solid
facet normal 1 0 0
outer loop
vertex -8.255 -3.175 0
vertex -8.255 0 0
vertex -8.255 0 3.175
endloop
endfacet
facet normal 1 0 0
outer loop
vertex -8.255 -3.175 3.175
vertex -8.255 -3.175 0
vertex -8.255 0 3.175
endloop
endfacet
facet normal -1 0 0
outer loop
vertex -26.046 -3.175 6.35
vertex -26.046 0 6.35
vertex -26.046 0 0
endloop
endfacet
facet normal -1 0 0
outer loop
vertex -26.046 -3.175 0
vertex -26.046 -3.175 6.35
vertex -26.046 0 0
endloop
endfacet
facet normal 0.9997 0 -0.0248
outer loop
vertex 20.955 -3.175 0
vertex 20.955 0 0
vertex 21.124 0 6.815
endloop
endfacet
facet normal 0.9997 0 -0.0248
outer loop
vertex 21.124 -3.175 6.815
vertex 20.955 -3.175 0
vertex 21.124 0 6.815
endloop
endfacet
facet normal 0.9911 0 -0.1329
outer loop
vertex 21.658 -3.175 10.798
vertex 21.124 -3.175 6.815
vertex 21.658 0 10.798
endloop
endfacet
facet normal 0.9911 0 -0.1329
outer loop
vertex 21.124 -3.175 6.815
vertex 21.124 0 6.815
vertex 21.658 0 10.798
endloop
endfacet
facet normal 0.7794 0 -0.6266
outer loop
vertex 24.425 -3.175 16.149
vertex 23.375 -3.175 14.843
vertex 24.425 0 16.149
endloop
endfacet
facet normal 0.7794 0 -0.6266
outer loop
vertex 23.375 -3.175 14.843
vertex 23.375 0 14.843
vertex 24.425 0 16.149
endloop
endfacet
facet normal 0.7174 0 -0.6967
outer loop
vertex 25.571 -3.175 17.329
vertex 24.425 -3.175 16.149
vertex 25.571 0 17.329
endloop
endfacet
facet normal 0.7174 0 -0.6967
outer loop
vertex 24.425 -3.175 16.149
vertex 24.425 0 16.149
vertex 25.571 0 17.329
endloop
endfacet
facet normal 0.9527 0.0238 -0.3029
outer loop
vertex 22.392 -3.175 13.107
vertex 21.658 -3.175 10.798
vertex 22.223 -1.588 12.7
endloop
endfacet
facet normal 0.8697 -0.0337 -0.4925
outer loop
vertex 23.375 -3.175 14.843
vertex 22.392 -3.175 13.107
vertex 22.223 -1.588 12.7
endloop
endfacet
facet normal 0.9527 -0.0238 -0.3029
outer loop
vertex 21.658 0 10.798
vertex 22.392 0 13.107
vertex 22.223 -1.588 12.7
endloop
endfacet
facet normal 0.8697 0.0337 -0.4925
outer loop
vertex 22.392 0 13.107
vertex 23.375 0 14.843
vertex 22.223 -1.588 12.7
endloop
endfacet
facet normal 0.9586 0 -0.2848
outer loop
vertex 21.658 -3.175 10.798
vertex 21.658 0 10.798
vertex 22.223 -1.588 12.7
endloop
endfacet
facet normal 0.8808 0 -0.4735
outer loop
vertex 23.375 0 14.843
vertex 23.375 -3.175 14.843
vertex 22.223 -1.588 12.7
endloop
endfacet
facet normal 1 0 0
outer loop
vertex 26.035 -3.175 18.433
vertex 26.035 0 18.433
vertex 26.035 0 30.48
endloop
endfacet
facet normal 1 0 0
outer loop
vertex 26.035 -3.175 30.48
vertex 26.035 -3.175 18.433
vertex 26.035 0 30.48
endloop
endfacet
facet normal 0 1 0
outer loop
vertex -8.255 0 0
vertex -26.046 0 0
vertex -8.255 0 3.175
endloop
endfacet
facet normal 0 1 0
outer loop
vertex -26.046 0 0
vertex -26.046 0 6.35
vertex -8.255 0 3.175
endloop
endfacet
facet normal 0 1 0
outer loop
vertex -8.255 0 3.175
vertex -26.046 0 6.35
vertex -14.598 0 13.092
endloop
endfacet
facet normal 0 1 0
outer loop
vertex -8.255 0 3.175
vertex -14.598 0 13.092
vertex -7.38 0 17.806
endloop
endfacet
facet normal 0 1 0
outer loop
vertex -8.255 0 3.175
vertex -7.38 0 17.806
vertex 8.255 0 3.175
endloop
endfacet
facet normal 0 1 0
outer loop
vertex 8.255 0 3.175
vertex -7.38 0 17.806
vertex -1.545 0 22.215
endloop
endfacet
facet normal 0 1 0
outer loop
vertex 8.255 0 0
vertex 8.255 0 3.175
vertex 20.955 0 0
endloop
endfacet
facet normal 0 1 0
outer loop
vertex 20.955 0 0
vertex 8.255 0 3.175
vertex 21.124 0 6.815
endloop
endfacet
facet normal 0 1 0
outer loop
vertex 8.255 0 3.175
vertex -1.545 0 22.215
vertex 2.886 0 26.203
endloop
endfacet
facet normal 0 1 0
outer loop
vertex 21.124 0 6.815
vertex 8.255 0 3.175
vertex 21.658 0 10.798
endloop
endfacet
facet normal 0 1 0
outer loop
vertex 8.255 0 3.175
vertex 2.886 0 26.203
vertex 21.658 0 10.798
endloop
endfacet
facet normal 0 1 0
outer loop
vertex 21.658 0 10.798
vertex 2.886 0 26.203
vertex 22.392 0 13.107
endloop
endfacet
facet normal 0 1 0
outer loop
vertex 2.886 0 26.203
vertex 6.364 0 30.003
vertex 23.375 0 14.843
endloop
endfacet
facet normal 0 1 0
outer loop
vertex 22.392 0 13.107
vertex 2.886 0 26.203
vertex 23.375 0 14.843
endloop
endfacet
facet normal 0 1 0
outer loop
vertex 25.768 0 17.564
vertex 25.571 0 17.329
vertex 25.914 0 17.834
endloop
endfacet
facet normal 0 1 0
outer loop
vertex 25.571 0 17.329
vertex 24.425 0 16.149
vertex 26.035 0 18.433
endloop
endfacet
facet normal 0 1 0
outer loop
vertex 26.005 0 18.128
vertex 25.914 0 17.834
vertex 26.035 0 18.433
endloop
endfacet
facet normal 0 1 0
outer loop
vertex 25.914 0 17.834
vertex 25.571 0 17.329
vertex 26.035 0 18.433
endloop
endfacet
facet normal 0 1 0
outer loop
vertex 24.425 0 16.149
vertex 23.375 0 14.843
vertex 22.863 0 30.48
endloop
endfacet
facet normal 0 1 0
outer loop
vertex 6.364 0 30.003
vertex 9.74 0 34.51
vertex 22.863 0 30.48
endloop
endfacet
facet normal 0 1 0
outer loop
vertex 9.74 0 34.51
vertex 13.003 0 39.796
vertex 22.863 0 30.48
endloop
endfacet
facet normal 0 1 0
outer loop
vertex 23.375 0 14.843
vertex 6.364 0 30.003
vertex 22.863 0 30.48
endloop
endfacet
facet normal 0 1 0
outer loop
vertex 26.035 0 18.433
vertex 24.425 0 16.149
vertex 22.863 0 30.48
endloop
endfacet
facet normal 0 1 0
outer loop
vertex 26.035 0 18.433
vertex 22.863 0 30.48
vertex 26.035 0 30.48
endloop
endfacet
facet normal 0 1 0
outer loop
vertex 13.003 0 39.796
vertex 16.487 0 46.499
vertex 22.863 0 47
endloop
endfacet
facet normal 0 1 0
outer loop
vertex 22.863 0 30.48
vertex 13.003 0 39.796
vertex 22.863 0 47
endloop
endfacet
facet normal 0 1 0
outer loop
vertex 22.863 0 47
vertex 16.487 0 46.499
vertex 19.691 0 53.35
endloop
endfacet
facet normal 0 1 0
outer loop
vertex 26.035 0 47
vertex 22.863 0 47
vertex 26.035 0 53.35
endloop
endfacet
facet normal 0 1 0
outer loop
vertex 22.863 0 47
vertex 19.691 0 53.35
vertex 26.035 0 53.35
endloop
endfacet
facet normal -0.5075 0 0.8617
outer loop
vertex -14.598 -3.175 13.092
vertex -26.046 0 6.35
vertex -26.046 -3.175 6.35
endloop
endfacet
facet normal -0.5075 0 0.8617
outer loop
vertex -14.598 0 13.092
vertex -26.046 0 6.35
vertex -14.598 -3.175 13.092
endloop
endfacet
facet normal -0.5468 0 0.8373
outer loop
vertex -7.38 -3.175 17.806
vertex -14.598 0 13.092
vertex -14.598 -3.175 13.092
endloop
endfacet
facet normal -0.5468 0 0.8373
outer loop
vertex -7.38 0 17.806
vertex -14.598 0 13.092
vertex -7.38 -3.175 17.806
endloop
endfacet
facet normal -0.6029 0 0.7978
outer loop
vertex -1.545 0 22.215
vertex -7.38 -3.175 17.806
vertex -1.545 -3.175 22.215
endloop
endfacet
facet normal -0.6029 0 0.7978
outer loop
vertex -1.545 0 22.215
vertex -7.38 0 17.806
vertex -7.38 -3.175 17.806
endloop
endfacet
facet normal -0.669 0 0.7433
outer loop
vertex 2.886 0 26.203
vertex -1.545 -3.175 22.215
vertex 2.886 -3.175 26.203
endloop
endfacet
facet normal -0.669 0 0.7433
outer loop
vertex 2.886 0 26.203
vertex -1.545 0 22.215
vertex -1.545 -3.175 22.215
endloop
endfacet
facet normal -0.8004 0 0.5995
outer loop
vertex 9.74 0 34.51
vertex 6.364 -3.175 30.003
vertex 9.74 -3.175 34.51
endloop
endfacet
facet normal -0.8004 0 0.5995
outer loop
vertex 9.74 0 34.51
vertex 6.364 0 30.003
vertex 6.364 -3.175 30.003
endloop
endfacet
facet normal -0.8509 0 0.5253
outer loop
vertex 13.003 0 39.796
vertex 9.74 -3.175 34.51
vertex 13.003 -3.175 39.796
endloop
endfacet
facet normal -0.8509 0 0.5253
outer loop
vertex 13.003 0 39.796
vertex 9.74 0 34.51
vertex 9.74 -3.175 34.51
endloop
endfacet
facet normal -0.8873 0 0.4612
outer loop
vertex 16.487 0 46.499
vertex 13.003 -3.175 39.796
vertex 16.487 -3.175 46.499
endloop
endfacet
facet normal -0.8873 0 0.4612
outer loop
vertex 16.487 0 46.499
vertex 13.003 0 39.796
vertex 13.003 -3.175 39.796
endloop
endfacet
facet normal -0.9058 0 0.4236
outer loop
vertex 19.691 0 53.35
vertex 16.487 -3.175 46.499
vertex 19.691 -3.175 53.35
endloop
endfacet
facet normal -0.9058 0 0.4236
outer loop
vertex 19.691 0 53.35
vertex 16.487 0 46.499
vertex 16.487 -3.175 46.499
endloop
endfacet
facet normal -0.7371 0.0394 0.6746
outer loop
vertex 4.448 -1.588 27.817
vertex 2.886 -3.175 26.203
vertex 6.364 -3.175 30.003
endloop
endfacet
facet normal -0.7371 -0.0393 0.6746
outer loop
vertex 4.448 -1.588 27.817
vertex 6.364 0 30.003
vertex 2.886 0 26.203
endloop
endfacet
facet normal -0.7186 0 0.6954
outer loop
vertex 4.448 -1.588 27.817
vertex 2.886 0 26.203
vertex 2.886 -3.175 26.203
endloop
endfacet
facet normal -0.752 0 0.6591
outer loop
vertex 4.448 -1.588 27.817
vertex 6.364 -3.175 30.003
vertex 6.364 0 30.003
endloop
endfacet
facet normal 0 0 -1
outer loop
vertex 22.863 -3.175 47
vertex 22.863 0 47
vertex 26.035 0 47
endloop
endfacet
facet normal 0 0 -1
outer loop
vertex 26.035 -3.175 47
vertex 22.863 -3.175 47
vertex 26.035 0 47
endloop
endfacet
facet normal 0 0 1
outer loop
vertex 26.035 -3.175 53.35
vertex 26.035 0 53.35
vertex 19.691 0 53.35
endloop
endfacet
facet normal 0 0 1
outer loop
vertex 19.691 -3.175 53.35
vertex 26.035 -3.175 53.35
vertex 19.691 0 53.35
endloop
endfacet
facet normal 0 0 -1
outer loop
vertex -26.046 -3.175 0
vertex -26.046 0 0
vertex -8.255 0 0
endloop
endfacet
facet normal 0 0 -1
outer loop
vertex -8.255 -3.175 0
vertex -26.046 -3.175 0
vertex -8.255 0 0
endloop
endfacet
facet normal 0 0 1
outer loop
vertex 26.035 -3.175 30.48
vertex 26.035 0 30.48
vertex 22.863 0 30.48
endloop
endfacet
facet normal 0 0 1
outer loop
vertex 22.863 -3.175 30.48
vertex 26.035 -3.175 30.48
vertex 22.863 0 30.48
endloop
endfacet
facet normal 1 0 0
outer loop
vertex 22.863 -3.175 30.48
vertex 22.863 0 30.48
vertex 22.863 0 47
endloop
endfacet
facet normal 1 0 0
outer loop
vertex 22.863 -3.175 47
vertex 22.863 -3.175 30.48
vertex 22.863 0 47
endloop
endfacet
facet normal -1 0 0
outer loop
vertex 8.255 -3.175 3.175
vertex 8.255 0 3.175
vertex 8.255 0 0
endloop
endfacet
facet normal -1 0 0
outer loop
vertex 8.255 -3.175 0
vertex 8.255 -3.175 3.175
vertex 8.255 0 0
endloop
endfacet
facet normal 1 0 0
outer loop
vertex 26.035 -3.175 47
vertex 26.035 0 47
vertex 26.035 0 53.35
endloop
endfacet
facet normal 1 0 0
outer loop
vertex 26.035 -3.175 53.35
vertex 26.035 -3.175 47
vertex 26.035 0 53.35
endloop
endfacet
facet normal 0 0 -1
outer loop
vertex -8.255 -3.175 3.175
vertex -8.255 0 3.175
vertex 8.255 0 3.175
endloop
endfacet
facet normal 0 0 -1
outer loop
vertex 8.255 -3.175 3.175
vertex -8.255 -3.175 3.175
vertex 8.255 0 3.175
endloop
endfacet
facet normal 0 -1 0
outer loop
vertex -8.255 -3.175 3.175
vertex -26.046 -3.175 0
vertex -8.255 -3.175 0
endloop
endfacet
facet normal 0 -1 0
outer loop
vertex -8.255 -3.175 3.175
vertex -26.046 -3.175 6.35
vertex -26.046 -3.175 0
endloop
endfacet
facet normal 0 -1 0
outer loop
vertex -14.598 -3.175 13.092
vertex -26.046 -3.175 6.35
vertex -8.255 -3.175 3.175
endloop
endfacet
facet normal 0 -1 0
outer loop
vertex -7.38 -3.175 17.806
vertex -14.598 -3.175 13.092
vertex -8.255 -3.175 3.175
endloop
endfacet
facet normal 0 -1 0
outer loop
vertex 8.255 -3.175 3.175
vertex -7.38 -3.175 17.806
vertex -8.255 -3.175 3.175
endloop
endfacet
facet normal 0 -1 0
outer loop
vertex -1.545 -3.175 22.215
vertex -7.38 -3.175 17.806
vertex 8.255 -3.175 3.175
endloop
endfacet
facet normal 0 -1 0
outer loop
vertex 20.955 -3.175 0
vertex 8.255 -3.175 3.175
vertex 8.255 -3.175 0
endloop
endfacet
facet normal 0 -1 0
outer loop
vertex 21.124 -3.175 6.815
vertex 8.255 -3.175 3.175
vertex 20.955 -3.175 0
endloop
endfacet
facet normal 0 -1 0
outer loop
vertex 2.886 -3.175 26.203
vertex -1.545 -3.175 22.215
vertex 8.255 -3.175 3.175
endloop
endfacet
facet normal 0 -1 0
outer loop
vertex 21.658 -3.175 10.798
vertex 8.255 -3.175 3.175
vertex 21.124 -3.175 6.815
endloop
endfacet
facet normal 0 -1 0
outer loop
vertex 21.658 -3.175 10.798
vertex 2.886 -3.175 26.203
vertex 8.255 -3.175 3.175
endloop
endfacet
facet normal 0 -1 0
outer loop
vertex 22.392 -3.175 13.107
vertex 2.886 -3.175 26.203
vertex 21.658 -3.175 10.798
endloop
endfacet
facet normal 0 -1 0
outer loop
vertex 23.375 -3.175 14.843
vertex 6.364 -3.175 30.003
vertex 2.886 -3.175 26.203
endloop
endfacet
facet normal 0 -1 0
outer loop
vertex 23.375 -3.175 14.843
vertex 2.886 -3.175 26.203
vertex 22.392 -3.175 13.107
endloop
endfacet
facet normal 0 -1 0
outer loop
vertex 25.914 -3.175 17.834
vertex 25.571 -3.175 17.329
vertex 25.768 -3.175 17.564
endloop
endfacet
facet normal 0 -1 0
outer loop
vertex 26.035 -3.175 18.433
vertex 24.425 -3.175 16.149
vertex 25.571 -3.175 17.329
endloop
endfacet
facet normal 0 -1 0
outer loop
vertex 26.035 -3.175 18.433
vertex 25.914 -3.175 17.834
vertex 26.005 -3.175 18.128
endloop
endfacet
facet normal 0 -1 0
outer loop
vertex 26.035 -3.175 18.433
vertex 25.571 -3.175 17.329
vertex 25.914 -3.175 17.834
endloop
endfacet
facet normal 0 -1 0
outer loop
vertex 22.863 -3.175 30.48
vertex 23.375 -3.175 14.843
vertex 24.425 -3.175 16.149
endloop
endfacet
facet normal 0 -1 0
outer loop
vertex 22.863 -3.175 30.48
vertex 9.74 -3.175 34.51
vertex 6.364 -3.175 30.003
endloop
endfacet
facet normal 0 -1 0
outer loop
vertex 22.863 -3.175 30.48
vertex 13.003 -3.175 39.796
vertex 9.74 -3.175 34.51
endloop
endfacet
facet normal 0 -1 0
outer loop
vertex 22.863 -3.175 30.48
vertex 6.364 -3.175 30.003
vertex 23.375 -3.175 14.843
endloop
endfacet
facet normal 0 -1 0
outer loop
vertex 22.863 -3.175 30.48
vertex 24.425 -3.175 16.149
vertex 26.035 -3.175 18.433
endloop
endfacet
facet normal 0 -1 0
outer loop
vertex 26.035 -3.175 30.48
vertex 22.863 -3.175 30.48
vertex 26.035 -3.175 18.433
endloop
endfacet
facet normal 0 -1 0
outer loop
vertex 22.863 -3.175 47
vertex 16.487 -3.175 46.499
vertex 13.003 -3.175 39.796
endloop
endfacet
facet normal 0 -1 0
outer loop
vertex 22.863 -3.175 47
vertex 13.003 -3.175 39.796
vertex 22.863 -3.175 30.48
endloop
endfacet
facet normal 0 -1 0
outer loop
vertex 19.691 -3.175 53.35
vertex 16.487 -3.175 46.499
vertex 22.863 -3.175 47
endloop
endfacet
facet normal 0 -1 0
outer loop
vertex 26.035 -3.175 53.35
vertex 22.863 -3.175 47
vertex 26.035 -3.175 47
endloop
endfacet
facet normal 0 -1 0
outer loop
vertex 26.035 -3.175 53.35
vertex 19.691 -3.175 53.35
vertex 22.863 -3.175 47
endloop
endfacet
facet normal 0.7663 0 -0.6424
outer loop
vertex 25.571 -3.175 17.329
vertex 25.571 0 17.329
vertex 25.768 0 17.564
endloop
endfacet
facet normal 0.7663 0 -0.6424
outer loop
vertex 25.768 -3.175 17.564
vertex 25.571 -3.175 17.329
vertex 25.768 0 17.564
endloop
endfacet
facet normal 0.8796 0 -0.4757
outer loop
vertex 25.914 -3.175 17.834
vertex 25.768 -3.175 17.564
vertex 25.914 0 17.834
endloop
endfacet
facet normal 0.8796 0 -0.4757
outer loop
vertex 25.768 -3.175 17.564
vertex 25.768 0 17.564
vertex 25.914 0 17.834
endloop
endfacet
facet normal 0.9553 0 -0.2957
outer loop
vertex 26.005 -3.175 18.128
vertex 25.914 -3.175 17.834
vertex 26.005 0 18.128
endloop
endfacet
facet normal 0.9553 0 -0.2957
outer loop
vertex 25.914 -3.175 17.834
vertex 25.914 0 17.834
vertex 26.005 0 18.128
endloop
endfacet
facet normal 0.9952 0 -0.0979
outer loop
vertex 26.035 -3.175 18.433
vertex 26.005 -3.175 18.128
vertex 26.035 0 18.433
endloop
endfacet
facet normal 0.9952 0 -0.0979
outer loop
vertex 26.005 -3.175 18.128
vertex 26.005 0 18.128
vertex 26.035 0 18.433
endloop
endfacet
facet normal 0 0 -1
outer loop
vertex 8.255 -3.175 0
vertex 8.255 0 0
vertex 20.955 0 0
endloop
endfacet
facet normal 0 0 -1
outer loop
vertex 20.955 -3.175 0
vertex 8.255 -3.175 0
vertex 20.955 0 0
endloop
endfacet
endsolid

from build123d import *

# Parameters (mm, degrees)
F1_DEPTH = 3.175


with BuildPart() as f1:
    # F0 (on Front) → F1 (new body)
    with BuildSketch(Plane.XZ):
        with BuildLine():
            Line((-26.0459613055, 0), (-8.255, 0))
            Line((-8.255, 0), (-8.255, 3.175))
            Line((-8.255, 3.175), (8.255, 3.175))
            Line((8.255, 3.175), (8.255, 0))
            Line((8.255, 0), (20.955, 0))
            add(Edge.make_bspline(
                [(20.955, 0), (20.9736007659, 4.7706959948), (21.0039408253, 12.5522680544), (24.2599950378, 16.0448016341), (25.5707021463, 17.3285181683)],
                knots=[0, 0, 0, 0, 0.5863679016, 0.9564357243, 0.9564357243, 0.9564357243, 0.9564357243], degree=3))
            ThreePointArc((25.5707021463, 17.3285181683), (25.9142071586, 17.8340267538), (26.035, 18.4331458679))
            Line((26.035, 18.4331458679), (26.035, 30.48))
            Line((26.035, 30.48), (22.8629365507, 30.48))
            Line((22.8629365507, 30.48), (22.8629365507, 46.9999574125))
            Line((22.8629365507, 46.9999574125), (26.035, 46.9999574125))
            Line((26.035, 46.9999574125), (26.035, 53.3499574125))
            Line((26.035, 53.3499574125), (19.6908731014, 53.3499574125))
            add(Edge.make_bspline(
                [(-26.0459613055, 6.35), (-14.6993313754, 12.8784414899), (6.7793902362, 25.2365229805), (15.5524054536, 44.3388670459), (19.6908731014, 53.3499574125)],
                knots=[0, 0, 0, 0, 0.5282730572, 1, 1, 1, 1], degree=3))
            Line((-26.0459613055, 6.35), (-26.0459613055, 0))
        make_face()
    extrude(amount=F1_DEPTH)


solid = f1.part
